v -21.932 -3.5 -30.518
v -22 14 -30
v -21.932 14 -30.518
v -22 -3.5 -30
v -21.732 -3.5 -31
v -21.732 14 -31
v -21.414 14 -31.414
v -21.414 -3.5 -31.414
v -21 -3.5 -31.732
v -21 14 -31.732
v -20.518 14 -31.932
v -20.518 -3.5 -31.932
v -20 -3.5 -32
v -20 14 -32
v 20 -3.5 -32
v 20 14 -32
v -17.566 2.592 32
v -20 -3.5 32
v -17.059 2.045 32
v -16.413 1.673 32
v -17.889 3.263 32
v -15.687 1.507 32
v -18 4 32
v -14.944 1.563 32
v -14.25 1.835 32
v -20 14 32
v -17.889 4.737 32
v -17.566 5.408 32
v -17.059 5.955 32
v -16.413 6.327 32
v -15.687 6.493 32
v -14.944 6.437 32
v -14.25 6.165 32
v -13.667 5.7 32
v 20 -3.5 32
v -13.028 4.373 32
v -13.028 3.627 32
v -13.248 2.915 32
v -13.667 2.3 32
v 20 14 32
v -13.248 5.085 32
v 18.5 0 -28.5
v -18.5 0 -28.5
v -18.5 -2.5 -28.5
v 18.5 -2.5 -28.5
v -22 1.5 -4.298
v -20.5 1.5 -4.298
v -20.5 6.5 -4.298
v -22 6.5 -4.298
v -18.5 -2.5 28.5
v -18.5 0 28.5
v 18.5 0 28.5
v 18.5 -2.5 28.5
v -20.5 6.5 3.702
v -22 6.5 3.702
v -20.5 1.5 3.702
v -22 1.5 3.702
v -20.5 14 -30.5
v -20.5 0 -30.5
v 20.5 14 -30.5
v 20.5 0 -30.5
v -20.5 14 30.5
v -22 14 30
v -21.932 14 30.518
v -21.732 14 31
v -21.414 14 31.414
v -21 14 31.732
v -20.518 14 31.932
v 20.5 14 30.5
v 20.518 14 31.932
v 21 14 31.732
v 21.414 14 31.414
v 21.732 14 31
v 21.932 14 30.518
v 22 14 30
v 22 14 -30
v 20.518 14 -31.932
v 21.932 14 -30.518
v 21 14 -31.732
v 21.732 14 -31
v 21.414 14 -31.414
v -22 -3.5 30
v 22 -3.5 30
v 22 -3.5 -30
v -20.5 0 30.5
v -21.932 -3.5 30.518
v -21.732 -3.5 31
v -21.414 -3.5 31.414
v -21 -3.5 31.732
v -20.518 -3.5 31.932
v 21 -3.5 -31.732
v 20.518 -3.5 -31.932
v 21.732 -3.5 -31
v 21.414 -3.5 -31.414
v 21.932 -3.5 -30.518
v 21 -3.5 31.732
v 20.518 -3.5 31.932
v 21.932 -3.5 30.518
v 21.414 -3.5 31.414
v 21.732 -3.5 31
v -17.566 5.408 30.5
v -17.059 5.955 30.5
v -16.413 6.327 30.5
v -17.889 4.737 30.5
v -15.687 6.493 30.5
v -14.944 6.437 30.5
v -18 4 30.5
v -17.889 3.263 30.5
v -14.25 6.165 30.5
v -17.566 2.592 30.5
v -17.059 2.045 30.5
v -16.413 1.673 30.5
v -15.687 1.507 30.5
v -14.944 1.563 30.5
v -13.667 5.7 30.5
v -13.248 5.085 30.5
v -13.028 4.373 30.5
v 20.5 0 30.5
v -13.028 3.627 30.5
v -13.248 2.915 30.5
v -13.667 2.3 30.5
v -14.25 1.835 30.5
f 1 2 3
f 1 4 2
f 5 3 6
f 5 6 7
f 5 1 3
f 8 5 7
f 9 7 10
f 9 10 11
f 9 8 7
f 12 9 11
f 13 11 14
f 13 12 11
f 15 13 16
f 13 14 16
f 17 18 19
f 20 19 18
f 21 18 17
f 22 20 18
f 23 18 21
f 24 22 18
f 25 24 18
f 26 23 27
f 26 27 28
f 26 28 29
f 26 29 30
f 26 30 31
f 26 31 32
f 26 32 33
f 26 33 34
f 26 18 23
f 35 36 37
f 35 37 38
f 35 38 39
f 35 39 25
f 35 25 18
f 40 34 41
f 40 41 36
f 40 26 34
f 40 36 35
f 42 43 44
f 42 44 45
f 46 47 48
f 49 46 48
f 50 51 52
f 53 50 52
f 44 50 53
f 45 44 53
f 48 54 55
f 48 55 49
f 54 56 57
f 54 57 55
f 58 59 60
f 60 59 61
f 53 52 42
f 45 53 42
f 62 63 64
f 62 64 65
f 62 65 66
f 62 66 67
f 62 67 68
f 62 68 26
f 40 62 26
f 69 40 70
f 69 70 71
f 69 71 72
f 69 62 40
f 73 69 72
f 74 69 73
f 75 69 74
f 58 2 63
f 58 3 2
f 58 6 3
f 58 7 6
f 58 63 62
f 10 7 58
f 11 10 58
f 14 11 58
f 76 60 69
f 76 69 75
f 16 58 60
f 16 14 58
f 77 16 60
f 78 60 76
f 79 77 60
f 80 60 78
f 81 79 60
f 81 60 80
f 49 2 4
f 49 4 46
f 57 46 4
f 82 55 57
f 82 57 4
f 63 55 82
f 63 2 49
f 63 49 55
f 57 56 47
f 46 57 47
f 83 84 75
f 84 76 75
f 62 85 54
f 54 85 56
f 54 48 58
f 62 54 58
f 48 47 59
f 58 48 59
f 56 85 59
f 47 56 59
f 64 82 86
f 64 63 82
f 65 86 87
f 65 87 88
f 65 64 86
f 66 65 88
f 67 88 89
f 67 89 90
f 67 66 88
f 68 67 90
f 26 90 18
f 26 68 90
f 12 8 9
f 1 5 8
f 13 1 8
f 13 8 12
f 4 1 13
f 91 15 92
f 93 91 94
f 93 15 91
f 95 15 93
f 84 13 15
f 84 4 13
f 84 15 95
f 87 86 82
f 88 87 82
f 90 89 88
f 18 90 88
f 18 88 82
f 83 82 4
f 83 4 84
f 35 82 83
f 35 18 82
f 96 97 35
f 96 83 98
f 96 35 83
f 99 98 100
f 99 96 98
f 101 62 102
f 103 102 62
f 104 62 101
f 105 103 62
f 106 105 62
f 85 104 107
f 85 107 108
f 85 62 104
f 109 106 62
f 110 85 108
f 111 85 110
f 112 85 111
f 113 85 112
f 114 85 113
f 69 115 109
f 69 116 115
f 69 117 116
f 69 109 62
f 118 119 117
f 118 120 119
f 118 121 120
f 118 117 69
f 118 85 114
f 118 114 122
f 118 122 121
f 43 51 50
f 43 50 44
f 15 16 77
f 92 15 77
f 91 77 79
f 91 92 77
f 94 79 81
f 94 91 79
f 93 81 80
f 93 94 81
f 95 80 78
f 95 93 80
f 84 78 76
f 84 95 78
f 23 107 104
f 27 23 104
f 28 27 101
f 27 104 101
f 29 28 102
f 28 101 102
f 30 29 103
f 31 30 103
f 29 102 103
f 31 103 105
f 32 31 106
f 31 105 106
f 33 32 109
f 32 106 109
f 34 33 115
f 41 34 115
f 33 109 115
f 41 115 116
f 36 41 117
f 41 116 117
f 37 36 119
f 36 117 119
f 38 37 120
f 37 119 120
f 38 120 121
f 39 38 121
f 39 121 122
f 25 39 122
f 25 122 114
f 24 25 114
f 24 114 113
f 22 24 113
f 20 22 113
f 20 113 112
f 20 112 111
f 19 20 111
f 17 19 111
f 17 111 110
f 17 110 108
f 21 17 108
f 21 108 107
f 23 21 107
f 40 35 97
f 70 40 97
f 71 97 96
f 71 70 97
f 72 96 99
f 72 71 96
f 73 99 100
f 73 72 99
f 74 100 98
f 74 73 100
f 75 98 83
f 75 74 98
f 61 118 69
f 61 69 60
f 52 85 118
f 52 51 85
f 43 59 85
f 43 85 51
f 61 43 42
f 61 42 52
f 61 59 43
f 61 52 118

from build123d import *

# Parameters (mm, degrees)
SKETCH1_W           = 44
SKETCH1_H           = 64
SKETCH1_W_2         = 40
SKETCH1_H_2         = 60
SKETCH1_W_3         = 37
SKETCH1_H_3         = 57
BOSS_EXTRUDE1_DEPTH = 2.5
SKETCH2_W           = 44
SKETCH2_H           = 64
SKETCH2_W_2         = 41
SKETCH2_H_2         = 61
BOSS_EXTRUDE2_DEPTH = 14
SKETCH3_W           = 44
SKETCH3_H           = 64
BOSS_EXTRUDE3_DEPTH = 1
SKETCH4_W           = 8
SKETCH4_H           = 5
CUT_EXTRUDE1_DEPTH  = 8
SKETCH5_R           = 2.5
CUT_EXTRUDE2_DEPTH  = 8
FILLET1_R           = 2


with BuildPart() as part:
    # Sketch1 → Boss-Extrude1 (new body)
    # profile 1 of 2: a face of its own
    with BuildSketch(Plane(origin=(0, 0, 0), x_dir=(1, 0, 0), z_dir=(0, 1, 0))):
        Rectangle(SKETCH1_W, SKETCH1_H)
        Rectangle(SKETCH1_W_2, SKETCH1_H_2, mode=Mode.SUBTRACT)
    # profile 2 of 2: a face of its own
    with BuildSketch(Plane(origin=(0, 0, 0), x_dir=(1, 0, 0), z_dir=(0, 1, 0))):
        Rectangle(SKETCH1_W_2, SKETCH1_H_2)
        Rectangle(SKETCH1_W_3, SKETCH1_H_3, mode=Mode.SUBTRACT)
    extrude(amount=-BOSS_EXTRUDE1_DEPTH)

    # Sketch2 → Boss-Extrude2 (add)
    with BuildSketch(Plane(origin=(0, 0, 0), x_dir=(1, 0, 0), z_dir=(0, 1, 0))):
        Rectangle(SKETCH2_W, SKETCH2_H)
        Rectangle(SKETCH2_W_2, SKETCH2_H_2, mode=Mode.SUBTRACT)
    extrude(amount=BOSS_EXTRUDE2_DEPTH)

    # Sketch3 → Boss-Extrude3 (add)
    with BuildSketch(Plane.XZ.offset(2.5)):
        Rectangle(SKETCH3_W, SKETCH3_H)
    extrude(amount=BOSS_EXTRUDE3_DEPTH)

    # Sketch4 → Cut-Extrude1 (cut)
    with BuildSketch(Plane(origin=(-20.5, 0, 0), x_dir=(0, 0, -1), z_dir=(1, 0, 0))):
        with Locations((0.298083895, 4)):
            Rectangle(SKETCH4_W, SKETCH4_H)
    extrude(amount=-CUT_EXTRUDE1_DEPTH, mode=Mode.SUBTRACT)

    # Sketch5 → Cut-Extrude2 (cut)
    with BuildSketch(Plane(origin=(0, 0, 30.5), x_dir=(-1, 0, 0), z_dir=(0, 0, -1))):
        with Locations((15.5, 4)):
            Circle(SKETCH5_R)
    extrude(amount=-CUT_EXTRUDE2_DEPTH, mode=Mode.SUBTRACT)

    # Fillet1
    fillet1_edges = [part.edges().sort_by_distance(p)[0] for p in [
        (-22, 5.25, -32),
        (22, 5.25, -32),
        (22, 5.25, 32),
        (-22, 5.25, 32),
    ]]
    fillet(fillet1_edges, radius=FILLET1_R)


solid = part.part
